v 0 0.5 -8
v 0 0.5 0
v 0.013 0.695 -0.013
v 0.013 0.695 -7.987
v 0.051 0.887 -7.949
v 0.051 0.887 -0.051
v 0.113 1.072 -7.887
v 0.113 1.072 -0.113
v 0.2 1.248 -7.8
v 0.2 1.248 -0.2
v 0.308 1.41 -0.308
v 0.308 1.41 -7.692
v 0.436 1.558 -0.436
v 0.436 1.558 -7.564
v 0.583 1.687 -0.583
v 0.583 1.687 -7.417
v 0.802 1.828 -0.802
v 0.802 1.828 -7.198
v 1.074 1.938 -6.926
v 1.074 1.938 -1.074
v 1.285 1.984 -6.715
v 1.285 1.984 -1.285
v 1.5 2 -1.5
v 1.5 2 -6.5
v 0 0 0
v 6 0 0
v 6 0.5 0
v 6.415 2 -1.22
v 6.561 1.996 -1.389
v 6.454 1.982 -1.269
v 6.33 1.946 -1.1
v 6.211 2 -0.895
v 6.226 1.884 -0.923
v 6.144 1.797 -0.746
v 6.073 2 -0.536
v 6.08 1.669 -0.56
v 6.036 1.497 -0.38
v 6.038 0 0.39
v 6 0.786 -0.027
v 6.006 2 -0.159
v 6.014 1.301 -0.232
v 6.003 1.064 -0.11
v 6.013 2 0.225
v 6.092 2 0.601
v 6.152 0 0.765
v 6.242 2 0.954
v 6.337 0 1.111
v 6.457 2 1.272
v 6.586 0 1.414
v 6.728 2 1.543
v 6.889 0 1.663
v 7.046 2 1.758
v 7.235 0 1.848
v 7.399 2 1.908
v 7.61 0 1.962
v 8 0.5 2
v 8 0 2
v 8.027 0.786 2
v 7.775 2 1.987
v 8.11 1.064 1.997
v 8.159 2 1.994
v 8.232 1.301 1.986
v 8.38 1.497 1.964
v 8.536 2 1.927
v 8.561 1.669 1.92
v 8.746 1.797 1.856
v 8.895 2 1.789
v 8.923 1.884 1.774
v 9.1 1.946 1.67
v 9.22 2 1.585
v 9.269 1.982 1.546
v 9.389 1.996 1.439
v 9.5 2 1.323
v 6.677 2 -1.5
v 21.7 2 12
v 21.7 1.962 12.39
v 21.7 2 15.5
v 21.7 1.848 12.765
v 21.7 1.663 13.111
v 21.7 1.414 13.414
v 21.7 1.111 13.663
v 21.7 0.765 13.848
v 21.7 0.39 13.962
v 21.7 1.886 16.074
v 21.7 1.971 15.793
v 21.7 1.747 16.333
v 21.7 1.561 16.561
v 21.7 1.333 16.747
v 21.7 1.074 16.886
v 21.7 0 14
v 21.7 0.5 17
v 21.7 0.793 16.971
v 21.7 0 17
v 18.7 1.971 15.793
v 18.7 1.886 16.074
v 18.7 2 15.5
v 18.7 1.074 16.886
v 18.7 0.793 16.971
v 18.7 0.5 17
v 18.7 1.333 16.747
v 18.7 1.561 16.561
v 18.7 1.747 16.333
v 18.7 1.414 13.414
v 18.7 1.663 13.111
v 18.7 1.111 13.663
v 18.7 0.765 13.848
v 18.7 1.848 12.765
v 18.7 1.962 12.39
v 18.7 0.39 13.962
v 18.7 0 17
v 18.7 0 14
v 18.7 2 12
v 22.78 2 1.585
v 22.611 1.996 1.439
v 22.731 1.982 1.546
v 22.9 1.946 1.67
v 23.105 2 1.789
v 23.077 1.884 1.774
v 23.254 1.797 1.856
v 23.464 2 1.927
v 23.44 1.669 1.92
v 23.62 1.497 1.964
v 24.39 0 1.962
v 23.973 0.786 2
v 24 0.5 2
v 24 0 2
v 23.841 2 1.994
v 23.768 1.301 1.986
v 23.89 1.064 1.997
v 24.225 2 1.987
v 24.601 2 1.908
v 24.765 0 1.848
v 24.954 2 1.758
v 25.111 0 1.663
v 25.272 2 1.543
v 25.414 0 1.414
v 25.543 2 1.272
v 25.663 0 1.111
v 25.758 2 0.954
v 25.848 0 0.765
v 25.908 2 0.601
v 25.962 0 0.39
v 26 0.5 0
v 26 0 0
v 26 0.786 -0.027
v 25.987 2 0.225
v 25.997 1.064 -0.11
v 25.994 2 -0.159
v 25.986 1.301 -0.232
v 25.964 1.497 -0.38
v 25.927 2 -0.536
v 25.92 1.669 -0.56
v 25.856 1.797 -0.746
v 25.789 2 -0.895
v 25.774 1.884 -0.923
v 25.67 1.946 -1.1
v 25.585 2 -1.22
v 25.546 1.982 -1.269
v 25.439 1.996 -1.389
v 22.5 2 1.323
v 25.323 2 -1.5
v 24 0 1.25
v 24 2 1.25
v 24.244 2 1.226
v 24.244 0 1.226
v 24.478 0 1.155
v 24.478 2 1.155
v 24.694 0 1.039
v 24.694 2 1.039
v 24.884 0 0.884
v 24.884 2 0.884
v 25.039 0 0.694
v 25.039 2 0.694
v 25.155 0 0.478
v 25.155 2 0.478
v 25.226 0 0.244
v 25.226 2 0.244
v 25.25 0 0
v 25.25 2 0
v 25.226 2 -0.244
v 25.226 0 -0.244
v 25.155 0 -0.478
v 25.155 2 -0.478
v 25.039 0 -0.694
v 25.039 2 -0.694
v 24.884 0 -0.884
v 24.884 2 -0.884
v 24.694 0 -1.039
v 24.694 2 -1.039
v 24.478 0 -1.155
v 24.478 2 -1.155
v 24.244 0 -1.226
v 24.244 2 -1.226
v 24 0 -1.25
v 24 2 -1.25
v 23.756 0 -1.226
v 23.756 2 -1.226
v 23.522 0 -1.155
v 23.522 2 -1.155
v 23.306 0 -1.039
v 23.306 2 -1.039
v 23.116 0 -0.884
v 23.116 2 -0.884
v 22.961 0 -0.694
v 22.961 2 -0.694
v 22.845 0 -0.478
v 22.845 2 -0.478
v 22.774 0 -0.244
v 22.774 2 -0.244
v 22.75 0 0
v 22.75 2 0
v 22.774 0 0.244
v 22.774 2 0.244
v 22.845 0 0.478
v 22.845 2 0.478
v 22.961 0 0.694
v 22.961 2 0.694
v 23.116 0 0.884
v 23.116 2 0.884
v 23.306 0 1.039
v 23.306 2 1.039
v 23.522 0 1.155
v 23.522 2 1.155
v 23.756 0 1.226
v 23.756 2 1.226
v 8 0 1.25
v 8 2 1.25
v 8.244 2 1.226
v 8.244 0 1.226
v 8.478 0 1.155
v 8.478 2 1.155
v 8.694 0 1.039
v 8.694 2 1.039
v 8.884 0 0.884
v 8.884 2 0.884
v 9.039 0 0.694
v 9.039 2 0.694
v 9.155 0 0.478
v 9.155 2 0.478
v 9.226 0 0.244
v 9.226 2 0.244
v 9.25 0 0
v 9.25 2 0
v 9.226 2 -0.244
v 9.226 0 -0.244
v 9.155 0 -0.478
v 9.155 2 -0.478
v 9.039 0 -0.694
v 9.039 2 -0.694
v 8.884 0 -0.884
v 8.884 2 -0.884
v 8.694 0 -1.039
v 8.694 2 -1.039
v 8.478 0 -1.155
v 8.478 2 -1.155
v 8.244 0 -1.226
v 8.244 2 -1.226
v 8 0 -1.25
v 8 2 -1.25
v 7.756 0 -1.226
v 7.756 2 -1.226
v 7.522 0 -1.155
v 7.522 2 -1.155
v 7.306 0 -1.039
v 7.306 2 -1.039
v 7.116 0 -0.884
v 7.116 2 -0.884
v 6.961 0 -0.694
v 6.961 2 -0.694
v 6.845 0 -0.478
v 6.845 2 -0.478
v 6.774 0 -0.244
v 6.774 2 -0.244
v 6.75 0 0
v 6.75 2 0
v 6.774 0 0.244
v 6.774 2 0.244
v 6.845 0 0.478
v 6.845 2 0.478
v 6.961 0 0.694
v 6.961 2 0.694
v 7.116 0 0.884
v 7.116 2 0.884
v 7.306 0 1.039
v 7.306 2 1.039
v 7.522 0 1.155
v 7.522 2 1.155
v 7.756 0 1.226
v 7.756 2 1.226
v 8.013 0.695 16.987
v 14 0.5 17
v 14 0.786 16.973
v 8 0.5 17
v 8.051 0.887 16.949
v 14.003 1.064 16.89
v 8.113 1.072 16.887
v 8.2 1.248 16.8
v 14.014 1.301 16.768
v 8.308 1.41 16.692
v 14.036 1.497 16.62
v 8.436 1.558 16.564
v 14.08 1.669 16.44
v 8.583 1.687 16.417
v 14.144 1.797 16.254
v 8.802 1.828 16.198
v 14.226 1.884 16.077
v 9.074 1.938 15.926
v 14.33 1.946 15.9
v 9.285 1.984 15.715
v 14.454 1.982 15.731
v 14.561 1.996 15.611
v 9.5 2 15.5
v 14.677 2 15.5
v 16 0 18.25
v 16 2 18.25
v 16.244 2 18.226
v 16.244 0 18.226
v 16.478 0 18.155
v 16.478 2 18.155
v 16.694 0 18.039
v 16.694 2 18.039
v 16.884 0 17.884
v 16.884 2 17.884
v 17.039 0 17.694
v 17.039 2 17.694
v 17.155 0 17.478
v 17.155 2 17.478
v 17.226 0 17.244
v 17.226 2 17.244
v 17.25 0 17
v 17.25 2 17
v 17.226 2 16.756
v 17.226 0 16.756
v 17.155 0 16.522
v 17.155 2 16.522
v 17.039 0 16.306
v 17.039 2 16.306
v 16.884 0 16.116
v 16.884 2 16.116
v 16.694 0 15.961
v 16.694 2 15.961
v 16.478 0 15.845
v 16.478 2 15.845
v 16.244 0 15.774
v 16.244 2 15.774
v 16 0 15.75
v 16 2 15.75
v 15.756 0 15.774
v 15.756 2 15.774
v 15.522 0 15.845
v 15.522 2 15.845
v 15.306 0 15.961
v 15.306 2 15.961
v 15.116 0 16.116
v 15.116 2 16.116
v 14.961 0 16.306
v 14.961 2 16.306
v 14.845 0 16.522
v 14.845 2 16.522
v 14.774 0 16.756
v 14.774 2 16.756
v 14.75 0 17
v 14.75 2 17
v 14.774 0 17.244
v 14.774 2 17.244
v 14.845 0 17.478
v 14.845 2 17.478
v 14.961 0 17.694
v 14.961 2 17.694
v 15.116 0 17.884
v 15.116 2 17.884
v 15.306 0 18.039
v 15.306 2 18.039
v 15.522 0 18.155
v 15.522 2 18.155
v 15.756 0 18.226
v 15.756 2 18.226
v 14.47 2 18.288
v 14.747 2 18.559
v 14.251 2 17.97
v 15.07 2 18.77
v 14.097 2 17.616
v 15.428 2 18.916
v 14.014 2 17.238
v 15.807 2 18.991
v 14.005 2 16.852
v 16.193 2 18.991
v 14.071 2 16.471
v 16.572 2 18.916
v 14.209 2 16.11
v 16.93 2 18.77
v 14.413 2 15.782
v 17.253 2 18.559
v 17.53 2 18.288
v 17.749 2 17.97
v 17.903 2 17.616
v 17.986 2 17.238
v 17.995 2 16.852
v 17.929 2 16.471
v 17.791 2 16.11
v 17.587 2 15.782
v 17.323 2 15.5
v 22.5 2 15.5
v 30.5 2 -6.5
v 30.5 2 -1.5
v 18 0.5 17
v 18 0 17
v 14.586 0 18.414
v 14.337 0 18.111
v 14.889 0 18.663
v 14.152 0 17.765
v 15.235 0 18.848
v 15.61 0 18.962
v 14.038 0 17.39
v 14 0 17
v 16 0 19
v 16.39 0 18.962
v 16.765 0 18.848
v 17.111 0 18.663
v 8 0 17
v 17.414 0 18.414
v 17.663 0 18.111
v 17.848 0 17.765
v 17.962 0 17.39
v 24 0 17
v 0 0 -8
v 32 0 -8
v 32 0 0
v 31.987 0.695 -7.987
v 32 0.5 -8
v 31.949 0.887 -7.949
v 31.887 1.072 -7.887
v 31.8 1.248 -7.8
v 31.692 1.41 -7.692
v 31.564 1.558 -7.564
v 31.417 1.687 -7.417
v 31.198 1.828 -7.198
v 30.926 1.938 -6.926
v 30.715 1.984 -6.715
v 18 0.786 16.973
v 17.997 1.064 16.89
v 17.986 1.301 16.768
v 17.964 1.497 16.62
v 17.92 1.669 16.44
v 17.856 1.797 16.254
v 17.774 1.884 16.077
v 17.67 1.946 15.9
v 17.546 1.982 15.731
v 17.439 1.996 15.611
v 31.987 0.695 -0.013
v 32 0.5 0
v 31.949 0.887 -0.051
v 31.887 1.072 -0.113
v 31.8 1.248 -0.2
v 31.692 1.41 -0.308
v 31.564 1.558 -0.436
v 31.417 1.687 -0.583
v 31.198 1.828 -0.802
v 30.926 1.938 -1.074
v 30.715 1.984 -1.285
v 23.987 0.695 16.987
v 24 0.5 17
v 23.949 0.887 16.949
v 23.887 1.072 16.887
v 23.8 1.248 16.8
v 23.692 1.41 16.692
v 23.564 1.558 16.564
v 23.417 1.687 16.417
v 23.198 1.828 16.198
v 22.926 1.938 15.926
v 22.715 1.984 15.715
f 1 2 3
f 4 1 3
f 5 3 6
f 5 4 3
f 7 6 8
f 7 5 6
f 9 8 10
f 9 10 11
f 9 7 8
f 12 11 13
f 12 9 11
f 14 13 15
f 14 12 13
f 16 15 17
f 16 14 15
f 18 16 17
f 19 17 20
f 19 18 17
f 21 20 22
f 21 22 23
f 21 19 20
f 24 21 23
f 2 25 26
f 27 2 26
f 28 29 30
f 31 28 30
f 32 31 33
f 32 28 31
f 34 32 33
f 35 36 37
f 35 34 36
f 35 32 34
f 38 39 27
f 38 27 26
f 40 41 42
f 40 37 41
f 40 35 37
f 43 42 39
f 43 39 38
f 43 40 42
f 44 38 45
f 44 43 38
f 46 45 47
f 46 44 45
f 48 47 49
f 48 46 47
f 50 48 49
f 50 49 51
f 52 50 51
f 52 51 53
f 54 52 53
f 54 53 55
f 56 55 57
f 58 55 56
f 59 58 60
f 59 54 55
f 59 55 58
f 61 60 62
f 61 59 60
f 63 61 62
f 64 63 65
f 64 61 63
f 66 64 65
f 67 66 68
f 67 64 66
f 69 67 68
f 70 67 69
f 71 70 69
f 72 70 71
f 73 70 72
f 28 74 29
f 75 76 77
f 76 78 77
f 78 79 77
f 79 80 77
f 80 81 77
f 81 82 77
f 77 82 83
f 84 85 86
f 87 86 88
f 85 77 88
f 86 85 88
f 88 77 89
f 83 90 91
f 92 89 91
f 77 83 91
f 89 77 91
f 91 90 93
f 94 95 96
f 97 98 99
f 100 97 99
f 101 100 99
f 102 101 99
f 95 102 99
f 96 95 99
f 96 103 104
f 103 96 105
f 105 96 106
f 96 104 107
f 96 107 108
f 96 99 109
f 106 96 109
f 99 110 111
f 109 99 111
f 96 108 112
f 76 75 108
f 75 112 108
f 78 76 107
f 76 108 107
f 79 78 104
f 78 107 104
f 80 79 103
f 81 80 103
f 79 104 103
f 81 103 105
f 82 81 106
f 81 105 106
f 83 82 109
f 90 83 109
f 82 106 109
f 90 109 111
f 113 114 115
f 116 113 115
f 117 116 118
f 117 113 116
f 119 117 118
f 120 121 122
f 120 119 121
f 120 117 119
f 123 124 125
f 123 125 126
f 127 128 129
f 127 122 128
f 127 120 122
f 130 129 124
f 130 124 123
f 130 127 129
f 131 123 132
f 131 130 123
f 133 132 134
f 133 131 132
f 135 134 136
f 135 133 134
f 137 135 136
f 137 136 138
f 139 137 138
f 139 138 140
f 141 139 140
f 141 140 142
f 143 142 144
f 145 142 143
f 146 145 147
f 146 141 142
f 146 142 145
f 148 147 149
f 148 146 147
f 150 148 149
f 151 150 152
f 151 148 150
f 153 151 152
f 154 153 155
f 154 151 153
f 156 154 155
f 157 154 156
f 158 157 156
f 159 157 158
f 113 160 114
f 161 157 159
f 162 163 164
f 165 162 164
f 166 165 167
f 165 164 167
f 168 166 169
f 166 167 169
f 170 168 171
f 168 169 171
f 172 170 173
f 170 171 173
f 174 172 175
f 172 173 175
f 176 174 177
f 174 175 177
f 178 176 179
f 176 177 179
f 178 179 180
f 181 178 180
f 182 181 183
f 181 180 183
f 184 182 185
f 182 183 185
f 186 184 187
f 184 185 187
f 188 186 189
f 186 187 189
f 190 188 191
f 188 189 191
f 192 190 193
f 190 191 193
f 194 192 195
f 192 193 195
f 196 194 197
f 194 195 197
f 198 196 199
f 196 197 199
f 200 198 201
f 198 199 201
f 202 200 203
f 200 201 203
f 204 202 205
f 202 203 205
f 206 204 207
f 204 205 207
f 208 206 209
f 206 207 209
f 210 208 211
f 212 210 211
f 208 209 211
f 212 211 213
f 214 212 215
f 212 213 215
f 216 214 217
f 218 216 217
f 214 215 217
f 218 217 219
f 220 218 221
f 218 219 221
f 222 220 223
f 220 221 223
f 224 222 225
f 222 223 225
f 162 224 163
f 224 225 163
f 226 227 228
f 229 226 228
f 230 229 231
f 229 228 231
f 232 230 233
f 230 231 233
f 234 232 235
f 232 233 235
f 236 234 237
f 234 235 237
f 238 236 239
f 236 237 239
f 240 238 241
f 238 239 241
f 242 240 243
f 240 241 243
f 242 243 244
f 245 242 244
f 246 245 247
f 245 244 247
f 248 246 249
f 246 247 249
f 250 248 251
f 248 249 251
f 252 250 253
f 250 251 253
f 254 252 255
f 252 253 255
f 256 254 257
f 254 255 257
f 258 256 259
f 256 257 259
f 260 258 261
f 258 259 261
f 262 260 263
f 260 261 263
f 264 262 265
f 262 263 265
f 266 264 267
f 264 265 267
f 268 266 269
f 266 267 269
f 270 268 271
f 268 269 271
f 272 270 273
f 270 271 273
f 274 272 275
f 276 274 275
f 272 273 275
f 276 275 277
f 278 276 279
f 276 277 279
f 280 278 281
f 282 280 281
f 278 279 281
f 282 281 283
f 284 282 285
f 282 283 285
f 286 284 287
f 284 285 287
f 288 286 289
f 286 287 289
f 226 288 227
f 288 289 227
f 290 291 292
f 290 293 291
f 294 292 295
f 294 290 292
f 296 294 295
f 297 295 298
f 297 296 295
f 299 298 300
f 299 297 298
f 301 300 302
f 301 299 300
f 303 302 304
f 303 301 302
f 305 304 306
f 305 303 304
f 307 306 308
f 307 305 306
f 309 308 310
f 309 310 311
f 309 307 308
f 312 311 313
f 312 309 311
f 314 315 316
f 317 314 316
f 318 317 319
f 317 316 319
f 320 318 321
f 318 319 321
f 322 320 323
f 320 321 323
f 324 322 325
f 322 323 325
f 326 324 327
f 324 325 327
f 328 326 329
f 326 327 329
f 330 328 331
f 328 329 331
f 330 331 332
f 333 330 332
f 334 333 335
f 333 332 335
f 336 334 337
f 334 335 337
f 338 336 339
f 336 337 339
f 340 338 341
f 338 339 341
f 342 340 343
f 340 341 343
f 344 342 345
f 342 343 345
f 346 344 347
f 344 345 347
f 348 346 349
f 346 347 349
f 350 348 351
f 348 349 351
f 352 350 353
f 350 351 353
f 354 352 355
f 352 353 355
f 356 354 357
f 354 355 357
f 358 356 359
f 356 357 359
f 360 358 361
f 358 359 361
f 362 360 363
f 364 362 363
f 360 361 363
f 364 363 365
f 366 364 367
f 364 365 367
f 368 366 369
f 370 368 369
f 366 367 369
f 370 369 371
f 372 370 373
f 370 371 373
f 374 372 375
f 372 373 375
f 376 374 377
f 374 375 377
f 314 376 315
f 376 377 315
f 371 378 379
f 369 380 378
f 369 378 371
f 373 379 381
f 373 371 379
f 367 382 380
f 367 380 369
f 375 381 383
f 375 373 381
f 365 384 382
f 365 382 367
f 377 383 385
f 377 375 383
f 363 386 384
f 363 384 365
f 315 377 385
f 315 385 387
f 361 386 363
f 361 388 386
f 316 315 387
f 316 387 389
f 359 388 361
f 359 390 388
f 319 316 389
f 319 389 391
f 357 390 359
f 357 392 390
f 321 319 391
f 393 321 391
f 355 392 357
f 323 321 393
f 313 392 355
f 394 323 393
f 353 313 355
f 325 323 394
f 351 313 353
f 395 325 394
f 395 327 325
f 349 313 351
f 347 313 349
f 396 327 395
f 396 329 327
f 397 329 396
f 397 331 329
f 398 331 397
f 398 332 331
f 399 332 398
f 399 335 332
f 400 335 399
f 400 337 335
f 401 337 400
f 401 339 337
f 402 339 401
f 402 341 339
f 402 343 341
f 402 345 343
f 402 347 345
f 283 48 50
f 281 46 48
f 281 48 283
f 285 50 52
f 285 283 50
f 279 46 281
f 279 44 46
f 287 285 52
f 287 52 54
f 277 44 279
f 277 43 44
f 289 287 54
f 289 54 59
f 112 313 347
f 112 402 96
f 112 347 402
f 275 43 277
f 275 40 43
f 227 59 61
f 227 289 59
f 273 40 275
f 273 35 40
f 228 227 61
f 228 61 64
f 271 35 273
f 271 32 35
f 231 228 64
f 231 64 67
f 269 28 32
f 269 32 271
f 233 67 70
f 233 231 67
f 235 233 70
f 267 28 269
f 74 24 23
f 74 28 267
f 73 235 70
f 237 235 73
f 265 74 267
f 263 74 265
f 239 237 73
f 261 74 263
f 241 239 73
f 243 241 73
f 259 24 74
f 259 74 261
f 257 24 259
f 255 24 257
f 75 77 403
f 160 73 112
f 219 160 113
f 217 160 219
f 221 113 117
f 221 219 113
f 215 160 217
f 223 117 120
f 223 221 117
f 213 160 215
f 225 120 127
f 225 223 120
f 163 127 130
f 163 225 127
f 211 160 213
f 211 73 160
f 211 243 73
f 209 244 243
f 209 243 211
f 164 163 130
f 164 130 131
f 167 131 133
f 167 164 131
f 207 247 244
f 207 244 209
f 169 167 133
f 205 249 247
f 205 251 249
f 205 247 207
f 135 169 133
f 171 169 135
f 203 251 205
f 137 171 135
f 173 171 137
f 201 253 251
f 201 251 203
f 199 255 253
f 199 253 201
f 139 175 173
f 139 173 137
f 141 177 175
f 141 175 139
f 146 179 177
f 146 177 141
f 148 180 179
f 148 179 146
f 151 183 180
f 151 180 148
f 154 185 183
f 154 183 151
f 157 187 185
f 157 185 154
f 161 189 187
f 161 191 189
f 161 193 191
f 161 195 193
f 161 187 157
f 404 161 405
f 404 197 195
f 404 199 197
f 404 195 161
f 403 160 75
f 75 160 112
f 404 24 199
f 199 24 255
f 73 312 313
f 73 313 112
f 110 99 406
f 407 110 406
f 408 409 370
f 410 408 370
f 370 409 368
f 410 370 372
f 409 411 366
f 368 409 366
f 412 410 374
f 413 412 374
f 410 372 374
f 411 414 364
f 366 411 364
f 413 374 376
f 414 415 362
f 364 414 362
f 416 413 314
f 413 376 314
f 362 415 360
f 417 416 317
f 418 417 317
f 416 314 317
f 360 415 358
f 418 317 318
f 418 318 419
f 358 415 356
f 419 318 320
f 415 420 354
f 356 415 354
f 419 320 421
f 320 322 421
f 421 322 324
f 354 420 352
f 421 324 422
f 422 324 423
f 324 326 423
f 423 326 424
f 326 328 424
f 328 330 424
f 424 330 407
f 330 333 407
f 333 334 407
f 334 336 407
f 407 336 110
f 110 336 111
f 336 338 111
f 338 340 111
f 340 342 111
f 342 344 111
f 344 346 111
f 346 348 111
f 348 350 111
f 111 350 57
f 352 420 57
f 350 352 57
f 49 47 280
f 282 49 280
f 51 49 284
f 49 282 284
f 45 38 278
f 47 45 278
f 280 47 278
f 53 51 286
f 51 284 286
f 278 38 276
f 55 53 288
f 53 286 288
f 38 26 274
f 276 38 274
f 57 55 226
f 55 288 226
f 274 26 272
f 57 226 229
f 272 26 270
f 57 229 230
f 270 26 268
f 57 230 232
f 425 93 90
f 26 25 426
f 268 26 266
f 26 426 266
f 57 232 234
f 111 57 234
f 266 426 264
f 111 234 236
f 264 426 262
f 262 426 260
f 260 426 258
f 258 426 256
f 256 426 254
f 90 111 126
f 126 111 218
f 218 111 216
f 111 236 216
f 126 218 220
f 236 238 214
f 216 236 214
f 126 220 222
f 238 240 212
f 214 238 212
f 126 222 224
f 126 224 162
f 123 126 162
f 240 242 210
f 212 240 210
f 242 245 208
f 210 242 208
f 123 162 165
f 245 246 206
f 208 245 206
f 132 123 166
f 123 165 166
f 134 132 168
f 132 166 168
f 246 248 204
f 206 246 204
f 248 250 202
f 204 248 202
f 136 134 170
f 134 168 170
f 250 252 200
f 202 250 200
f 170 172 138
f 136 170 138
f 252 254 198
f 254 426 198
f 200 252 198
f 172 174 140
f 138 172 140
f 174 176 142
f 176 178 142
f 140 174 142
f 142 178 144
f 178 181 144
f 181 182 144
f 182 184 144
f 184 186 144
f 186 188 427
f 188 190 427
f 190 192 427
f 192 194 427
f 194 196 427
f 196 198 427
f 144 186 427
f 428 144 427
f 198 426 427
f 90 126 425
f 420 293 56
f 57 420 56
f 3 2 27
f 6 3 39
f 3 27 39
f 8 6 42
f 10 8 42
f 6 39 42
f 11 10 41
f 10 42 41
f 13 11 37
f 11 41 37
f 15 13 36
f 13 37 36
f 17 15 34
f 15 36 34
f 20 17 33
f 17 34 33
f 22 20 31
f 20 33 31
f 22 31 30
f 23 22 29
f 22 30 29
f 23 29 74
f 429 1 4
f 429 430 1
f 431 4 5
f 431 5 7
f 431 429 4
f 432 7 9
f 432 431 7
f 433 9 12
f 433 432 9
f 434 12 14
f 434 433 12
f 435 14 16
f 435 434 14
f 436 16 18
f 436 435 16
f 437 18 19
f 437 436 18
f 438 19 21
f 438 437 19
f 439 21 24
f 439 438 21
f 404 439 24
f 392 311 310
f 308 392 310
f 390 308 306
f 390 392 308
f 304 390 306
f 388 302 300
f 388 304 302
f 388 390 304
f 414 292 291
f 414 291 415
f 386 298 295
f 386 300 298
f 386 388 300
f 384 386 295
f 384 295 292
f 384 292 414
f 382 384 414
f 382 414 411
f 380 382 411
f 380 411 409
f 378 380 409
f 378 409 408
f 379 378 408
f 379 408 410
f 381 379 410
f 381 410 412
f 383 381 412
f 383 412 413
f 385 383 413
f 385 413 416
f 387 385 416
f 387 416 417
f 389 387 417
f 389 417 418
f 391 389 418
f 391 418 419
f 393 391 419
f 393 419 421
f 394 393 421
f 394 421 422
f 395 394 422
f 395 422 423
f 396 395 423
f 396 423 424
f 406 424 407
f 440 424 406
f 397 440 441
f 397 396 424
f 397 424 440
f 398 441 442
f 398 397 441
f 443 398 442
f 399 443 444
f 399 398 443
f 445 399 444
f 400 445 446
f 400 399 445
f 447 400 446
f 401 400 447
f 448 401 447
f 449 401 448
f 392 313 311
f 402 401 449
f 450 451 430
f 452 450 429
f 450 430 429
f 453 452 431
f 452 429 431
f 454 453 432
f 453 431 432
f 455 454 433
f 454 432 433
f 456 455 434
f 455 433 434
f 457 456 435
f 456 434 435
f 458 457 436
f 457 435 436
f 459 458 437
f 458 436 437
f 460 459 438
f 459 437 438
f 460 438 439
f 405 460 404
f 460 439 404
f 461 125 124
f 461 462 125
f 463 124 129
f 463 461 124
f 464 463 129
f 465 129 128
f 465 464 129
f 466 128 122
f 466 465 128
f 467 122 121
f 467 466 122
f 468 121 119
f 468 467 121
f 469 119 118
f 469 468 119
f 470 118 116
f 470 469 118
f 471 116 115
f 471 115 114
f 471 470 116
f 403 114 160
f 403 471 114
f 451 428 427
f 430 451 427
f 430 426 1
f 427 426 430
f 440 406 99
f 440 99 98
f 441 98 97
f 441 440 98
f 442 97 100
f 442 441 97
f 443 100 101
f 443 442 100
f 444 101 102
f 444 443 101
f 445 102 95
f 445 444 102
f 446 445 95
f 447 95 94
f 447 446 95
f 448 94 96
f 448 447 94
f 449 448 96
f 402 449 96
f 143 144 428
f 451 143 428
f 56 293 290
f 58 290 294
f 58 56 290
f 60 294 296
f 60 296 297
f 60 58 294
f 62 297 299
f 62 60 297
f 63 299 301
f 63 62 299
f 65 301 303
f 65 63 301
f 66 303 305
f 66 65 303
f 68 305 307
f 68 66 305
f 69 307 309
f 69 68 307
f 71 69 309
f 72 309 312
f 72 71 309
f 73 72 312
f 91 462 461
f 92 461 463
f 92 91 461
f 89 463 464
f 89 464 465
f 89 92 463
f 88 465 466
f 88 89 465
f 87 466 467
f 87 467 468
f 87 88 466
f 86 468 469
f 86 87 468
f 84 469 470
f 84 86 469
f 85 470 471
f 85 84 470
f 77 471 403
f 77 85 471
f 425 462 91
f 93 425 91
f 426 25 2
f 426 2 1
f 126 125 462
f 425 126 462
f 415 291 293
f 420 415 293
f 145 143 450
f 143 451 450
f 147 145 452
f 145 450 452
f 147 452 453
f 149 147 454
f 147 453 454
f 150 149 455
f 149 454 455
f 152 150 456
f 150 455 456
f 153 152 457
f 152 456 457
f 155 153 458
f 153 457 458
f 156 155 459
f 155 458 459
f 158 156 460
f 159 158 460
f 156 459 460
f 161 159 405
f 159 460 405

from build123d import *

# Parameters (mm, degrees)
ESQUISSE1_W             = 32
ESQUISSE1_H             = 8
BOSS_EXTRU_1_DEPTH      = 2
BOSS_EXTRU_2_DEPTH      = 2
ESQUISSE3_R             = 1.9999999999999996
ESQUISSE3_R_2           = 2.000000000000003
ESQUISSE3_R_3           = 1.9999999999999991
BOSS_EXTRU_3_DEPTH      = 2
ESQUISSE4_R             = 1.2499999999999991
ESQUISSE4_R_2           = 1.250000000000001
ESQUISSE4_R_3           = 1.2500000000000013
ENL_V_MAT_EXTRU_1_DEPTH = 2
CONG_1_R                = 1.5
ENL_V_MAT_EXTRU_2_DEPTH = 38.26929044937668
CONG_2_R                = 2


with BuildPart() as part:
    # Esquisse1 → Boss.-Extru.1 (new body)
    with BuildSketch(Plane(origin=(0, 0, 0), x_dir=(1, 0, 0), z_dir=(0, 1, 0))):
        with Locations((16, 4)):
            Rectangle(ESQUISSE1_W, ESQUISSE1_H)
    extrude(amount=BOSS_EXTRU_1_DEPTH)

    # Esquisse2 → Boss.-Extru.2 (add)
    with BuildSketch(Plane(origin=(0, 2, 0), x_dir=(1, 0, 0), z_dir=(0, 1, 0))):
        Polygon((8.000000000000002, 4.5e-16), (24, 2.41e-15), (24.000000000000004, -17), (8.000000000000004, -17), align=None)
    extrude(amount=-BOSS_EXTRU_2_DEPTH)

    # Esquisse3 → Boss.-Extru.3 (add)
    with BuildSketch(Plane(origin=(0, 2, 0), x_dir=(1, 0, 0), z_dir=(0, 1, 0))):
        with Locations((8.000000000000002, 0)):
            Circle(ESQUISSE3_R)
        with Locations((24, 2.41e-15)):
            Circle(ESQUISSE3_R_2)
        with Locations((16.000000000000004, -17)):
            Circle(ESQUISSE3_R_3)
    extrude(amount=-BOSS_EXTRU_3_DEPTH)

    # Esquisse4 → Enlèv. mat.-Extru.1 (cut)
    with BuildSketch(Plane(origin=(0, 2, 0), x_dir=(1, 0, 0), z_dir=(0, 1, 0))):
        with Locations(Location((8.000000000000002, 0, 0), (0, 0, 270))):
            Circle(ESQUISSE4_R)
        with Locations(Location((24, 2.41e-15, 0), (0, 0, 270))):
            Circle(ESQUISSE4_R_2)
        with Locations(Location((16.000000000000004, -17, 0), (0, 0, 270))):
            Circle(ESQUISSE4_R_3)
    extrude(amount=-ENL_V_MAT_EXTRU_1_DEPTH, mode=Mode.SUBTRACT)

    # Congé1
    cong_1_edges = [part.edges().sort_by_distance(p)[0] for p in [
        (32, 2, -4),
        (16, 2, -8),
        (11.000000000000004, 2, 17),
        (24.000000000000004, 2, 9.500000000000002),
        (8.000000000000004, 2, 9.5),
        (29, 2, 0),
        (0, 2, -4),
        (21.000000000000004, 2, 17),
        (3.000000000000001, 2, 0),
    ]]
    fillet(cong_1_edges, radius=CONG_1_R)

    # Esquisse5 → Enlèv. mat.-Extru.2 (cut, through all)
    with BuildSketch(Plane.XZ):
        Polygon((21.700000000000003, 17), (18.700000000000003, 17), (18.70000000000001, 14.000000000000002), (21.700000000000006, 14.000000000000002), align=None)
    extrude(amount=-ENL_V_MAT_EXTRU_2_DEPTH, mode=Mode.SUBTRACT)

    # Congé2
    cong_2_edges = [part.edges().sort_by_distance(p)[0] for p in [
        (20.20000000000001, 2, 14),
    ]]
    fillet(cong_2_edges, radius=CONG_2_R - 0.0001)  # a hair under: the kernel refuses the full size


solid = part.part
